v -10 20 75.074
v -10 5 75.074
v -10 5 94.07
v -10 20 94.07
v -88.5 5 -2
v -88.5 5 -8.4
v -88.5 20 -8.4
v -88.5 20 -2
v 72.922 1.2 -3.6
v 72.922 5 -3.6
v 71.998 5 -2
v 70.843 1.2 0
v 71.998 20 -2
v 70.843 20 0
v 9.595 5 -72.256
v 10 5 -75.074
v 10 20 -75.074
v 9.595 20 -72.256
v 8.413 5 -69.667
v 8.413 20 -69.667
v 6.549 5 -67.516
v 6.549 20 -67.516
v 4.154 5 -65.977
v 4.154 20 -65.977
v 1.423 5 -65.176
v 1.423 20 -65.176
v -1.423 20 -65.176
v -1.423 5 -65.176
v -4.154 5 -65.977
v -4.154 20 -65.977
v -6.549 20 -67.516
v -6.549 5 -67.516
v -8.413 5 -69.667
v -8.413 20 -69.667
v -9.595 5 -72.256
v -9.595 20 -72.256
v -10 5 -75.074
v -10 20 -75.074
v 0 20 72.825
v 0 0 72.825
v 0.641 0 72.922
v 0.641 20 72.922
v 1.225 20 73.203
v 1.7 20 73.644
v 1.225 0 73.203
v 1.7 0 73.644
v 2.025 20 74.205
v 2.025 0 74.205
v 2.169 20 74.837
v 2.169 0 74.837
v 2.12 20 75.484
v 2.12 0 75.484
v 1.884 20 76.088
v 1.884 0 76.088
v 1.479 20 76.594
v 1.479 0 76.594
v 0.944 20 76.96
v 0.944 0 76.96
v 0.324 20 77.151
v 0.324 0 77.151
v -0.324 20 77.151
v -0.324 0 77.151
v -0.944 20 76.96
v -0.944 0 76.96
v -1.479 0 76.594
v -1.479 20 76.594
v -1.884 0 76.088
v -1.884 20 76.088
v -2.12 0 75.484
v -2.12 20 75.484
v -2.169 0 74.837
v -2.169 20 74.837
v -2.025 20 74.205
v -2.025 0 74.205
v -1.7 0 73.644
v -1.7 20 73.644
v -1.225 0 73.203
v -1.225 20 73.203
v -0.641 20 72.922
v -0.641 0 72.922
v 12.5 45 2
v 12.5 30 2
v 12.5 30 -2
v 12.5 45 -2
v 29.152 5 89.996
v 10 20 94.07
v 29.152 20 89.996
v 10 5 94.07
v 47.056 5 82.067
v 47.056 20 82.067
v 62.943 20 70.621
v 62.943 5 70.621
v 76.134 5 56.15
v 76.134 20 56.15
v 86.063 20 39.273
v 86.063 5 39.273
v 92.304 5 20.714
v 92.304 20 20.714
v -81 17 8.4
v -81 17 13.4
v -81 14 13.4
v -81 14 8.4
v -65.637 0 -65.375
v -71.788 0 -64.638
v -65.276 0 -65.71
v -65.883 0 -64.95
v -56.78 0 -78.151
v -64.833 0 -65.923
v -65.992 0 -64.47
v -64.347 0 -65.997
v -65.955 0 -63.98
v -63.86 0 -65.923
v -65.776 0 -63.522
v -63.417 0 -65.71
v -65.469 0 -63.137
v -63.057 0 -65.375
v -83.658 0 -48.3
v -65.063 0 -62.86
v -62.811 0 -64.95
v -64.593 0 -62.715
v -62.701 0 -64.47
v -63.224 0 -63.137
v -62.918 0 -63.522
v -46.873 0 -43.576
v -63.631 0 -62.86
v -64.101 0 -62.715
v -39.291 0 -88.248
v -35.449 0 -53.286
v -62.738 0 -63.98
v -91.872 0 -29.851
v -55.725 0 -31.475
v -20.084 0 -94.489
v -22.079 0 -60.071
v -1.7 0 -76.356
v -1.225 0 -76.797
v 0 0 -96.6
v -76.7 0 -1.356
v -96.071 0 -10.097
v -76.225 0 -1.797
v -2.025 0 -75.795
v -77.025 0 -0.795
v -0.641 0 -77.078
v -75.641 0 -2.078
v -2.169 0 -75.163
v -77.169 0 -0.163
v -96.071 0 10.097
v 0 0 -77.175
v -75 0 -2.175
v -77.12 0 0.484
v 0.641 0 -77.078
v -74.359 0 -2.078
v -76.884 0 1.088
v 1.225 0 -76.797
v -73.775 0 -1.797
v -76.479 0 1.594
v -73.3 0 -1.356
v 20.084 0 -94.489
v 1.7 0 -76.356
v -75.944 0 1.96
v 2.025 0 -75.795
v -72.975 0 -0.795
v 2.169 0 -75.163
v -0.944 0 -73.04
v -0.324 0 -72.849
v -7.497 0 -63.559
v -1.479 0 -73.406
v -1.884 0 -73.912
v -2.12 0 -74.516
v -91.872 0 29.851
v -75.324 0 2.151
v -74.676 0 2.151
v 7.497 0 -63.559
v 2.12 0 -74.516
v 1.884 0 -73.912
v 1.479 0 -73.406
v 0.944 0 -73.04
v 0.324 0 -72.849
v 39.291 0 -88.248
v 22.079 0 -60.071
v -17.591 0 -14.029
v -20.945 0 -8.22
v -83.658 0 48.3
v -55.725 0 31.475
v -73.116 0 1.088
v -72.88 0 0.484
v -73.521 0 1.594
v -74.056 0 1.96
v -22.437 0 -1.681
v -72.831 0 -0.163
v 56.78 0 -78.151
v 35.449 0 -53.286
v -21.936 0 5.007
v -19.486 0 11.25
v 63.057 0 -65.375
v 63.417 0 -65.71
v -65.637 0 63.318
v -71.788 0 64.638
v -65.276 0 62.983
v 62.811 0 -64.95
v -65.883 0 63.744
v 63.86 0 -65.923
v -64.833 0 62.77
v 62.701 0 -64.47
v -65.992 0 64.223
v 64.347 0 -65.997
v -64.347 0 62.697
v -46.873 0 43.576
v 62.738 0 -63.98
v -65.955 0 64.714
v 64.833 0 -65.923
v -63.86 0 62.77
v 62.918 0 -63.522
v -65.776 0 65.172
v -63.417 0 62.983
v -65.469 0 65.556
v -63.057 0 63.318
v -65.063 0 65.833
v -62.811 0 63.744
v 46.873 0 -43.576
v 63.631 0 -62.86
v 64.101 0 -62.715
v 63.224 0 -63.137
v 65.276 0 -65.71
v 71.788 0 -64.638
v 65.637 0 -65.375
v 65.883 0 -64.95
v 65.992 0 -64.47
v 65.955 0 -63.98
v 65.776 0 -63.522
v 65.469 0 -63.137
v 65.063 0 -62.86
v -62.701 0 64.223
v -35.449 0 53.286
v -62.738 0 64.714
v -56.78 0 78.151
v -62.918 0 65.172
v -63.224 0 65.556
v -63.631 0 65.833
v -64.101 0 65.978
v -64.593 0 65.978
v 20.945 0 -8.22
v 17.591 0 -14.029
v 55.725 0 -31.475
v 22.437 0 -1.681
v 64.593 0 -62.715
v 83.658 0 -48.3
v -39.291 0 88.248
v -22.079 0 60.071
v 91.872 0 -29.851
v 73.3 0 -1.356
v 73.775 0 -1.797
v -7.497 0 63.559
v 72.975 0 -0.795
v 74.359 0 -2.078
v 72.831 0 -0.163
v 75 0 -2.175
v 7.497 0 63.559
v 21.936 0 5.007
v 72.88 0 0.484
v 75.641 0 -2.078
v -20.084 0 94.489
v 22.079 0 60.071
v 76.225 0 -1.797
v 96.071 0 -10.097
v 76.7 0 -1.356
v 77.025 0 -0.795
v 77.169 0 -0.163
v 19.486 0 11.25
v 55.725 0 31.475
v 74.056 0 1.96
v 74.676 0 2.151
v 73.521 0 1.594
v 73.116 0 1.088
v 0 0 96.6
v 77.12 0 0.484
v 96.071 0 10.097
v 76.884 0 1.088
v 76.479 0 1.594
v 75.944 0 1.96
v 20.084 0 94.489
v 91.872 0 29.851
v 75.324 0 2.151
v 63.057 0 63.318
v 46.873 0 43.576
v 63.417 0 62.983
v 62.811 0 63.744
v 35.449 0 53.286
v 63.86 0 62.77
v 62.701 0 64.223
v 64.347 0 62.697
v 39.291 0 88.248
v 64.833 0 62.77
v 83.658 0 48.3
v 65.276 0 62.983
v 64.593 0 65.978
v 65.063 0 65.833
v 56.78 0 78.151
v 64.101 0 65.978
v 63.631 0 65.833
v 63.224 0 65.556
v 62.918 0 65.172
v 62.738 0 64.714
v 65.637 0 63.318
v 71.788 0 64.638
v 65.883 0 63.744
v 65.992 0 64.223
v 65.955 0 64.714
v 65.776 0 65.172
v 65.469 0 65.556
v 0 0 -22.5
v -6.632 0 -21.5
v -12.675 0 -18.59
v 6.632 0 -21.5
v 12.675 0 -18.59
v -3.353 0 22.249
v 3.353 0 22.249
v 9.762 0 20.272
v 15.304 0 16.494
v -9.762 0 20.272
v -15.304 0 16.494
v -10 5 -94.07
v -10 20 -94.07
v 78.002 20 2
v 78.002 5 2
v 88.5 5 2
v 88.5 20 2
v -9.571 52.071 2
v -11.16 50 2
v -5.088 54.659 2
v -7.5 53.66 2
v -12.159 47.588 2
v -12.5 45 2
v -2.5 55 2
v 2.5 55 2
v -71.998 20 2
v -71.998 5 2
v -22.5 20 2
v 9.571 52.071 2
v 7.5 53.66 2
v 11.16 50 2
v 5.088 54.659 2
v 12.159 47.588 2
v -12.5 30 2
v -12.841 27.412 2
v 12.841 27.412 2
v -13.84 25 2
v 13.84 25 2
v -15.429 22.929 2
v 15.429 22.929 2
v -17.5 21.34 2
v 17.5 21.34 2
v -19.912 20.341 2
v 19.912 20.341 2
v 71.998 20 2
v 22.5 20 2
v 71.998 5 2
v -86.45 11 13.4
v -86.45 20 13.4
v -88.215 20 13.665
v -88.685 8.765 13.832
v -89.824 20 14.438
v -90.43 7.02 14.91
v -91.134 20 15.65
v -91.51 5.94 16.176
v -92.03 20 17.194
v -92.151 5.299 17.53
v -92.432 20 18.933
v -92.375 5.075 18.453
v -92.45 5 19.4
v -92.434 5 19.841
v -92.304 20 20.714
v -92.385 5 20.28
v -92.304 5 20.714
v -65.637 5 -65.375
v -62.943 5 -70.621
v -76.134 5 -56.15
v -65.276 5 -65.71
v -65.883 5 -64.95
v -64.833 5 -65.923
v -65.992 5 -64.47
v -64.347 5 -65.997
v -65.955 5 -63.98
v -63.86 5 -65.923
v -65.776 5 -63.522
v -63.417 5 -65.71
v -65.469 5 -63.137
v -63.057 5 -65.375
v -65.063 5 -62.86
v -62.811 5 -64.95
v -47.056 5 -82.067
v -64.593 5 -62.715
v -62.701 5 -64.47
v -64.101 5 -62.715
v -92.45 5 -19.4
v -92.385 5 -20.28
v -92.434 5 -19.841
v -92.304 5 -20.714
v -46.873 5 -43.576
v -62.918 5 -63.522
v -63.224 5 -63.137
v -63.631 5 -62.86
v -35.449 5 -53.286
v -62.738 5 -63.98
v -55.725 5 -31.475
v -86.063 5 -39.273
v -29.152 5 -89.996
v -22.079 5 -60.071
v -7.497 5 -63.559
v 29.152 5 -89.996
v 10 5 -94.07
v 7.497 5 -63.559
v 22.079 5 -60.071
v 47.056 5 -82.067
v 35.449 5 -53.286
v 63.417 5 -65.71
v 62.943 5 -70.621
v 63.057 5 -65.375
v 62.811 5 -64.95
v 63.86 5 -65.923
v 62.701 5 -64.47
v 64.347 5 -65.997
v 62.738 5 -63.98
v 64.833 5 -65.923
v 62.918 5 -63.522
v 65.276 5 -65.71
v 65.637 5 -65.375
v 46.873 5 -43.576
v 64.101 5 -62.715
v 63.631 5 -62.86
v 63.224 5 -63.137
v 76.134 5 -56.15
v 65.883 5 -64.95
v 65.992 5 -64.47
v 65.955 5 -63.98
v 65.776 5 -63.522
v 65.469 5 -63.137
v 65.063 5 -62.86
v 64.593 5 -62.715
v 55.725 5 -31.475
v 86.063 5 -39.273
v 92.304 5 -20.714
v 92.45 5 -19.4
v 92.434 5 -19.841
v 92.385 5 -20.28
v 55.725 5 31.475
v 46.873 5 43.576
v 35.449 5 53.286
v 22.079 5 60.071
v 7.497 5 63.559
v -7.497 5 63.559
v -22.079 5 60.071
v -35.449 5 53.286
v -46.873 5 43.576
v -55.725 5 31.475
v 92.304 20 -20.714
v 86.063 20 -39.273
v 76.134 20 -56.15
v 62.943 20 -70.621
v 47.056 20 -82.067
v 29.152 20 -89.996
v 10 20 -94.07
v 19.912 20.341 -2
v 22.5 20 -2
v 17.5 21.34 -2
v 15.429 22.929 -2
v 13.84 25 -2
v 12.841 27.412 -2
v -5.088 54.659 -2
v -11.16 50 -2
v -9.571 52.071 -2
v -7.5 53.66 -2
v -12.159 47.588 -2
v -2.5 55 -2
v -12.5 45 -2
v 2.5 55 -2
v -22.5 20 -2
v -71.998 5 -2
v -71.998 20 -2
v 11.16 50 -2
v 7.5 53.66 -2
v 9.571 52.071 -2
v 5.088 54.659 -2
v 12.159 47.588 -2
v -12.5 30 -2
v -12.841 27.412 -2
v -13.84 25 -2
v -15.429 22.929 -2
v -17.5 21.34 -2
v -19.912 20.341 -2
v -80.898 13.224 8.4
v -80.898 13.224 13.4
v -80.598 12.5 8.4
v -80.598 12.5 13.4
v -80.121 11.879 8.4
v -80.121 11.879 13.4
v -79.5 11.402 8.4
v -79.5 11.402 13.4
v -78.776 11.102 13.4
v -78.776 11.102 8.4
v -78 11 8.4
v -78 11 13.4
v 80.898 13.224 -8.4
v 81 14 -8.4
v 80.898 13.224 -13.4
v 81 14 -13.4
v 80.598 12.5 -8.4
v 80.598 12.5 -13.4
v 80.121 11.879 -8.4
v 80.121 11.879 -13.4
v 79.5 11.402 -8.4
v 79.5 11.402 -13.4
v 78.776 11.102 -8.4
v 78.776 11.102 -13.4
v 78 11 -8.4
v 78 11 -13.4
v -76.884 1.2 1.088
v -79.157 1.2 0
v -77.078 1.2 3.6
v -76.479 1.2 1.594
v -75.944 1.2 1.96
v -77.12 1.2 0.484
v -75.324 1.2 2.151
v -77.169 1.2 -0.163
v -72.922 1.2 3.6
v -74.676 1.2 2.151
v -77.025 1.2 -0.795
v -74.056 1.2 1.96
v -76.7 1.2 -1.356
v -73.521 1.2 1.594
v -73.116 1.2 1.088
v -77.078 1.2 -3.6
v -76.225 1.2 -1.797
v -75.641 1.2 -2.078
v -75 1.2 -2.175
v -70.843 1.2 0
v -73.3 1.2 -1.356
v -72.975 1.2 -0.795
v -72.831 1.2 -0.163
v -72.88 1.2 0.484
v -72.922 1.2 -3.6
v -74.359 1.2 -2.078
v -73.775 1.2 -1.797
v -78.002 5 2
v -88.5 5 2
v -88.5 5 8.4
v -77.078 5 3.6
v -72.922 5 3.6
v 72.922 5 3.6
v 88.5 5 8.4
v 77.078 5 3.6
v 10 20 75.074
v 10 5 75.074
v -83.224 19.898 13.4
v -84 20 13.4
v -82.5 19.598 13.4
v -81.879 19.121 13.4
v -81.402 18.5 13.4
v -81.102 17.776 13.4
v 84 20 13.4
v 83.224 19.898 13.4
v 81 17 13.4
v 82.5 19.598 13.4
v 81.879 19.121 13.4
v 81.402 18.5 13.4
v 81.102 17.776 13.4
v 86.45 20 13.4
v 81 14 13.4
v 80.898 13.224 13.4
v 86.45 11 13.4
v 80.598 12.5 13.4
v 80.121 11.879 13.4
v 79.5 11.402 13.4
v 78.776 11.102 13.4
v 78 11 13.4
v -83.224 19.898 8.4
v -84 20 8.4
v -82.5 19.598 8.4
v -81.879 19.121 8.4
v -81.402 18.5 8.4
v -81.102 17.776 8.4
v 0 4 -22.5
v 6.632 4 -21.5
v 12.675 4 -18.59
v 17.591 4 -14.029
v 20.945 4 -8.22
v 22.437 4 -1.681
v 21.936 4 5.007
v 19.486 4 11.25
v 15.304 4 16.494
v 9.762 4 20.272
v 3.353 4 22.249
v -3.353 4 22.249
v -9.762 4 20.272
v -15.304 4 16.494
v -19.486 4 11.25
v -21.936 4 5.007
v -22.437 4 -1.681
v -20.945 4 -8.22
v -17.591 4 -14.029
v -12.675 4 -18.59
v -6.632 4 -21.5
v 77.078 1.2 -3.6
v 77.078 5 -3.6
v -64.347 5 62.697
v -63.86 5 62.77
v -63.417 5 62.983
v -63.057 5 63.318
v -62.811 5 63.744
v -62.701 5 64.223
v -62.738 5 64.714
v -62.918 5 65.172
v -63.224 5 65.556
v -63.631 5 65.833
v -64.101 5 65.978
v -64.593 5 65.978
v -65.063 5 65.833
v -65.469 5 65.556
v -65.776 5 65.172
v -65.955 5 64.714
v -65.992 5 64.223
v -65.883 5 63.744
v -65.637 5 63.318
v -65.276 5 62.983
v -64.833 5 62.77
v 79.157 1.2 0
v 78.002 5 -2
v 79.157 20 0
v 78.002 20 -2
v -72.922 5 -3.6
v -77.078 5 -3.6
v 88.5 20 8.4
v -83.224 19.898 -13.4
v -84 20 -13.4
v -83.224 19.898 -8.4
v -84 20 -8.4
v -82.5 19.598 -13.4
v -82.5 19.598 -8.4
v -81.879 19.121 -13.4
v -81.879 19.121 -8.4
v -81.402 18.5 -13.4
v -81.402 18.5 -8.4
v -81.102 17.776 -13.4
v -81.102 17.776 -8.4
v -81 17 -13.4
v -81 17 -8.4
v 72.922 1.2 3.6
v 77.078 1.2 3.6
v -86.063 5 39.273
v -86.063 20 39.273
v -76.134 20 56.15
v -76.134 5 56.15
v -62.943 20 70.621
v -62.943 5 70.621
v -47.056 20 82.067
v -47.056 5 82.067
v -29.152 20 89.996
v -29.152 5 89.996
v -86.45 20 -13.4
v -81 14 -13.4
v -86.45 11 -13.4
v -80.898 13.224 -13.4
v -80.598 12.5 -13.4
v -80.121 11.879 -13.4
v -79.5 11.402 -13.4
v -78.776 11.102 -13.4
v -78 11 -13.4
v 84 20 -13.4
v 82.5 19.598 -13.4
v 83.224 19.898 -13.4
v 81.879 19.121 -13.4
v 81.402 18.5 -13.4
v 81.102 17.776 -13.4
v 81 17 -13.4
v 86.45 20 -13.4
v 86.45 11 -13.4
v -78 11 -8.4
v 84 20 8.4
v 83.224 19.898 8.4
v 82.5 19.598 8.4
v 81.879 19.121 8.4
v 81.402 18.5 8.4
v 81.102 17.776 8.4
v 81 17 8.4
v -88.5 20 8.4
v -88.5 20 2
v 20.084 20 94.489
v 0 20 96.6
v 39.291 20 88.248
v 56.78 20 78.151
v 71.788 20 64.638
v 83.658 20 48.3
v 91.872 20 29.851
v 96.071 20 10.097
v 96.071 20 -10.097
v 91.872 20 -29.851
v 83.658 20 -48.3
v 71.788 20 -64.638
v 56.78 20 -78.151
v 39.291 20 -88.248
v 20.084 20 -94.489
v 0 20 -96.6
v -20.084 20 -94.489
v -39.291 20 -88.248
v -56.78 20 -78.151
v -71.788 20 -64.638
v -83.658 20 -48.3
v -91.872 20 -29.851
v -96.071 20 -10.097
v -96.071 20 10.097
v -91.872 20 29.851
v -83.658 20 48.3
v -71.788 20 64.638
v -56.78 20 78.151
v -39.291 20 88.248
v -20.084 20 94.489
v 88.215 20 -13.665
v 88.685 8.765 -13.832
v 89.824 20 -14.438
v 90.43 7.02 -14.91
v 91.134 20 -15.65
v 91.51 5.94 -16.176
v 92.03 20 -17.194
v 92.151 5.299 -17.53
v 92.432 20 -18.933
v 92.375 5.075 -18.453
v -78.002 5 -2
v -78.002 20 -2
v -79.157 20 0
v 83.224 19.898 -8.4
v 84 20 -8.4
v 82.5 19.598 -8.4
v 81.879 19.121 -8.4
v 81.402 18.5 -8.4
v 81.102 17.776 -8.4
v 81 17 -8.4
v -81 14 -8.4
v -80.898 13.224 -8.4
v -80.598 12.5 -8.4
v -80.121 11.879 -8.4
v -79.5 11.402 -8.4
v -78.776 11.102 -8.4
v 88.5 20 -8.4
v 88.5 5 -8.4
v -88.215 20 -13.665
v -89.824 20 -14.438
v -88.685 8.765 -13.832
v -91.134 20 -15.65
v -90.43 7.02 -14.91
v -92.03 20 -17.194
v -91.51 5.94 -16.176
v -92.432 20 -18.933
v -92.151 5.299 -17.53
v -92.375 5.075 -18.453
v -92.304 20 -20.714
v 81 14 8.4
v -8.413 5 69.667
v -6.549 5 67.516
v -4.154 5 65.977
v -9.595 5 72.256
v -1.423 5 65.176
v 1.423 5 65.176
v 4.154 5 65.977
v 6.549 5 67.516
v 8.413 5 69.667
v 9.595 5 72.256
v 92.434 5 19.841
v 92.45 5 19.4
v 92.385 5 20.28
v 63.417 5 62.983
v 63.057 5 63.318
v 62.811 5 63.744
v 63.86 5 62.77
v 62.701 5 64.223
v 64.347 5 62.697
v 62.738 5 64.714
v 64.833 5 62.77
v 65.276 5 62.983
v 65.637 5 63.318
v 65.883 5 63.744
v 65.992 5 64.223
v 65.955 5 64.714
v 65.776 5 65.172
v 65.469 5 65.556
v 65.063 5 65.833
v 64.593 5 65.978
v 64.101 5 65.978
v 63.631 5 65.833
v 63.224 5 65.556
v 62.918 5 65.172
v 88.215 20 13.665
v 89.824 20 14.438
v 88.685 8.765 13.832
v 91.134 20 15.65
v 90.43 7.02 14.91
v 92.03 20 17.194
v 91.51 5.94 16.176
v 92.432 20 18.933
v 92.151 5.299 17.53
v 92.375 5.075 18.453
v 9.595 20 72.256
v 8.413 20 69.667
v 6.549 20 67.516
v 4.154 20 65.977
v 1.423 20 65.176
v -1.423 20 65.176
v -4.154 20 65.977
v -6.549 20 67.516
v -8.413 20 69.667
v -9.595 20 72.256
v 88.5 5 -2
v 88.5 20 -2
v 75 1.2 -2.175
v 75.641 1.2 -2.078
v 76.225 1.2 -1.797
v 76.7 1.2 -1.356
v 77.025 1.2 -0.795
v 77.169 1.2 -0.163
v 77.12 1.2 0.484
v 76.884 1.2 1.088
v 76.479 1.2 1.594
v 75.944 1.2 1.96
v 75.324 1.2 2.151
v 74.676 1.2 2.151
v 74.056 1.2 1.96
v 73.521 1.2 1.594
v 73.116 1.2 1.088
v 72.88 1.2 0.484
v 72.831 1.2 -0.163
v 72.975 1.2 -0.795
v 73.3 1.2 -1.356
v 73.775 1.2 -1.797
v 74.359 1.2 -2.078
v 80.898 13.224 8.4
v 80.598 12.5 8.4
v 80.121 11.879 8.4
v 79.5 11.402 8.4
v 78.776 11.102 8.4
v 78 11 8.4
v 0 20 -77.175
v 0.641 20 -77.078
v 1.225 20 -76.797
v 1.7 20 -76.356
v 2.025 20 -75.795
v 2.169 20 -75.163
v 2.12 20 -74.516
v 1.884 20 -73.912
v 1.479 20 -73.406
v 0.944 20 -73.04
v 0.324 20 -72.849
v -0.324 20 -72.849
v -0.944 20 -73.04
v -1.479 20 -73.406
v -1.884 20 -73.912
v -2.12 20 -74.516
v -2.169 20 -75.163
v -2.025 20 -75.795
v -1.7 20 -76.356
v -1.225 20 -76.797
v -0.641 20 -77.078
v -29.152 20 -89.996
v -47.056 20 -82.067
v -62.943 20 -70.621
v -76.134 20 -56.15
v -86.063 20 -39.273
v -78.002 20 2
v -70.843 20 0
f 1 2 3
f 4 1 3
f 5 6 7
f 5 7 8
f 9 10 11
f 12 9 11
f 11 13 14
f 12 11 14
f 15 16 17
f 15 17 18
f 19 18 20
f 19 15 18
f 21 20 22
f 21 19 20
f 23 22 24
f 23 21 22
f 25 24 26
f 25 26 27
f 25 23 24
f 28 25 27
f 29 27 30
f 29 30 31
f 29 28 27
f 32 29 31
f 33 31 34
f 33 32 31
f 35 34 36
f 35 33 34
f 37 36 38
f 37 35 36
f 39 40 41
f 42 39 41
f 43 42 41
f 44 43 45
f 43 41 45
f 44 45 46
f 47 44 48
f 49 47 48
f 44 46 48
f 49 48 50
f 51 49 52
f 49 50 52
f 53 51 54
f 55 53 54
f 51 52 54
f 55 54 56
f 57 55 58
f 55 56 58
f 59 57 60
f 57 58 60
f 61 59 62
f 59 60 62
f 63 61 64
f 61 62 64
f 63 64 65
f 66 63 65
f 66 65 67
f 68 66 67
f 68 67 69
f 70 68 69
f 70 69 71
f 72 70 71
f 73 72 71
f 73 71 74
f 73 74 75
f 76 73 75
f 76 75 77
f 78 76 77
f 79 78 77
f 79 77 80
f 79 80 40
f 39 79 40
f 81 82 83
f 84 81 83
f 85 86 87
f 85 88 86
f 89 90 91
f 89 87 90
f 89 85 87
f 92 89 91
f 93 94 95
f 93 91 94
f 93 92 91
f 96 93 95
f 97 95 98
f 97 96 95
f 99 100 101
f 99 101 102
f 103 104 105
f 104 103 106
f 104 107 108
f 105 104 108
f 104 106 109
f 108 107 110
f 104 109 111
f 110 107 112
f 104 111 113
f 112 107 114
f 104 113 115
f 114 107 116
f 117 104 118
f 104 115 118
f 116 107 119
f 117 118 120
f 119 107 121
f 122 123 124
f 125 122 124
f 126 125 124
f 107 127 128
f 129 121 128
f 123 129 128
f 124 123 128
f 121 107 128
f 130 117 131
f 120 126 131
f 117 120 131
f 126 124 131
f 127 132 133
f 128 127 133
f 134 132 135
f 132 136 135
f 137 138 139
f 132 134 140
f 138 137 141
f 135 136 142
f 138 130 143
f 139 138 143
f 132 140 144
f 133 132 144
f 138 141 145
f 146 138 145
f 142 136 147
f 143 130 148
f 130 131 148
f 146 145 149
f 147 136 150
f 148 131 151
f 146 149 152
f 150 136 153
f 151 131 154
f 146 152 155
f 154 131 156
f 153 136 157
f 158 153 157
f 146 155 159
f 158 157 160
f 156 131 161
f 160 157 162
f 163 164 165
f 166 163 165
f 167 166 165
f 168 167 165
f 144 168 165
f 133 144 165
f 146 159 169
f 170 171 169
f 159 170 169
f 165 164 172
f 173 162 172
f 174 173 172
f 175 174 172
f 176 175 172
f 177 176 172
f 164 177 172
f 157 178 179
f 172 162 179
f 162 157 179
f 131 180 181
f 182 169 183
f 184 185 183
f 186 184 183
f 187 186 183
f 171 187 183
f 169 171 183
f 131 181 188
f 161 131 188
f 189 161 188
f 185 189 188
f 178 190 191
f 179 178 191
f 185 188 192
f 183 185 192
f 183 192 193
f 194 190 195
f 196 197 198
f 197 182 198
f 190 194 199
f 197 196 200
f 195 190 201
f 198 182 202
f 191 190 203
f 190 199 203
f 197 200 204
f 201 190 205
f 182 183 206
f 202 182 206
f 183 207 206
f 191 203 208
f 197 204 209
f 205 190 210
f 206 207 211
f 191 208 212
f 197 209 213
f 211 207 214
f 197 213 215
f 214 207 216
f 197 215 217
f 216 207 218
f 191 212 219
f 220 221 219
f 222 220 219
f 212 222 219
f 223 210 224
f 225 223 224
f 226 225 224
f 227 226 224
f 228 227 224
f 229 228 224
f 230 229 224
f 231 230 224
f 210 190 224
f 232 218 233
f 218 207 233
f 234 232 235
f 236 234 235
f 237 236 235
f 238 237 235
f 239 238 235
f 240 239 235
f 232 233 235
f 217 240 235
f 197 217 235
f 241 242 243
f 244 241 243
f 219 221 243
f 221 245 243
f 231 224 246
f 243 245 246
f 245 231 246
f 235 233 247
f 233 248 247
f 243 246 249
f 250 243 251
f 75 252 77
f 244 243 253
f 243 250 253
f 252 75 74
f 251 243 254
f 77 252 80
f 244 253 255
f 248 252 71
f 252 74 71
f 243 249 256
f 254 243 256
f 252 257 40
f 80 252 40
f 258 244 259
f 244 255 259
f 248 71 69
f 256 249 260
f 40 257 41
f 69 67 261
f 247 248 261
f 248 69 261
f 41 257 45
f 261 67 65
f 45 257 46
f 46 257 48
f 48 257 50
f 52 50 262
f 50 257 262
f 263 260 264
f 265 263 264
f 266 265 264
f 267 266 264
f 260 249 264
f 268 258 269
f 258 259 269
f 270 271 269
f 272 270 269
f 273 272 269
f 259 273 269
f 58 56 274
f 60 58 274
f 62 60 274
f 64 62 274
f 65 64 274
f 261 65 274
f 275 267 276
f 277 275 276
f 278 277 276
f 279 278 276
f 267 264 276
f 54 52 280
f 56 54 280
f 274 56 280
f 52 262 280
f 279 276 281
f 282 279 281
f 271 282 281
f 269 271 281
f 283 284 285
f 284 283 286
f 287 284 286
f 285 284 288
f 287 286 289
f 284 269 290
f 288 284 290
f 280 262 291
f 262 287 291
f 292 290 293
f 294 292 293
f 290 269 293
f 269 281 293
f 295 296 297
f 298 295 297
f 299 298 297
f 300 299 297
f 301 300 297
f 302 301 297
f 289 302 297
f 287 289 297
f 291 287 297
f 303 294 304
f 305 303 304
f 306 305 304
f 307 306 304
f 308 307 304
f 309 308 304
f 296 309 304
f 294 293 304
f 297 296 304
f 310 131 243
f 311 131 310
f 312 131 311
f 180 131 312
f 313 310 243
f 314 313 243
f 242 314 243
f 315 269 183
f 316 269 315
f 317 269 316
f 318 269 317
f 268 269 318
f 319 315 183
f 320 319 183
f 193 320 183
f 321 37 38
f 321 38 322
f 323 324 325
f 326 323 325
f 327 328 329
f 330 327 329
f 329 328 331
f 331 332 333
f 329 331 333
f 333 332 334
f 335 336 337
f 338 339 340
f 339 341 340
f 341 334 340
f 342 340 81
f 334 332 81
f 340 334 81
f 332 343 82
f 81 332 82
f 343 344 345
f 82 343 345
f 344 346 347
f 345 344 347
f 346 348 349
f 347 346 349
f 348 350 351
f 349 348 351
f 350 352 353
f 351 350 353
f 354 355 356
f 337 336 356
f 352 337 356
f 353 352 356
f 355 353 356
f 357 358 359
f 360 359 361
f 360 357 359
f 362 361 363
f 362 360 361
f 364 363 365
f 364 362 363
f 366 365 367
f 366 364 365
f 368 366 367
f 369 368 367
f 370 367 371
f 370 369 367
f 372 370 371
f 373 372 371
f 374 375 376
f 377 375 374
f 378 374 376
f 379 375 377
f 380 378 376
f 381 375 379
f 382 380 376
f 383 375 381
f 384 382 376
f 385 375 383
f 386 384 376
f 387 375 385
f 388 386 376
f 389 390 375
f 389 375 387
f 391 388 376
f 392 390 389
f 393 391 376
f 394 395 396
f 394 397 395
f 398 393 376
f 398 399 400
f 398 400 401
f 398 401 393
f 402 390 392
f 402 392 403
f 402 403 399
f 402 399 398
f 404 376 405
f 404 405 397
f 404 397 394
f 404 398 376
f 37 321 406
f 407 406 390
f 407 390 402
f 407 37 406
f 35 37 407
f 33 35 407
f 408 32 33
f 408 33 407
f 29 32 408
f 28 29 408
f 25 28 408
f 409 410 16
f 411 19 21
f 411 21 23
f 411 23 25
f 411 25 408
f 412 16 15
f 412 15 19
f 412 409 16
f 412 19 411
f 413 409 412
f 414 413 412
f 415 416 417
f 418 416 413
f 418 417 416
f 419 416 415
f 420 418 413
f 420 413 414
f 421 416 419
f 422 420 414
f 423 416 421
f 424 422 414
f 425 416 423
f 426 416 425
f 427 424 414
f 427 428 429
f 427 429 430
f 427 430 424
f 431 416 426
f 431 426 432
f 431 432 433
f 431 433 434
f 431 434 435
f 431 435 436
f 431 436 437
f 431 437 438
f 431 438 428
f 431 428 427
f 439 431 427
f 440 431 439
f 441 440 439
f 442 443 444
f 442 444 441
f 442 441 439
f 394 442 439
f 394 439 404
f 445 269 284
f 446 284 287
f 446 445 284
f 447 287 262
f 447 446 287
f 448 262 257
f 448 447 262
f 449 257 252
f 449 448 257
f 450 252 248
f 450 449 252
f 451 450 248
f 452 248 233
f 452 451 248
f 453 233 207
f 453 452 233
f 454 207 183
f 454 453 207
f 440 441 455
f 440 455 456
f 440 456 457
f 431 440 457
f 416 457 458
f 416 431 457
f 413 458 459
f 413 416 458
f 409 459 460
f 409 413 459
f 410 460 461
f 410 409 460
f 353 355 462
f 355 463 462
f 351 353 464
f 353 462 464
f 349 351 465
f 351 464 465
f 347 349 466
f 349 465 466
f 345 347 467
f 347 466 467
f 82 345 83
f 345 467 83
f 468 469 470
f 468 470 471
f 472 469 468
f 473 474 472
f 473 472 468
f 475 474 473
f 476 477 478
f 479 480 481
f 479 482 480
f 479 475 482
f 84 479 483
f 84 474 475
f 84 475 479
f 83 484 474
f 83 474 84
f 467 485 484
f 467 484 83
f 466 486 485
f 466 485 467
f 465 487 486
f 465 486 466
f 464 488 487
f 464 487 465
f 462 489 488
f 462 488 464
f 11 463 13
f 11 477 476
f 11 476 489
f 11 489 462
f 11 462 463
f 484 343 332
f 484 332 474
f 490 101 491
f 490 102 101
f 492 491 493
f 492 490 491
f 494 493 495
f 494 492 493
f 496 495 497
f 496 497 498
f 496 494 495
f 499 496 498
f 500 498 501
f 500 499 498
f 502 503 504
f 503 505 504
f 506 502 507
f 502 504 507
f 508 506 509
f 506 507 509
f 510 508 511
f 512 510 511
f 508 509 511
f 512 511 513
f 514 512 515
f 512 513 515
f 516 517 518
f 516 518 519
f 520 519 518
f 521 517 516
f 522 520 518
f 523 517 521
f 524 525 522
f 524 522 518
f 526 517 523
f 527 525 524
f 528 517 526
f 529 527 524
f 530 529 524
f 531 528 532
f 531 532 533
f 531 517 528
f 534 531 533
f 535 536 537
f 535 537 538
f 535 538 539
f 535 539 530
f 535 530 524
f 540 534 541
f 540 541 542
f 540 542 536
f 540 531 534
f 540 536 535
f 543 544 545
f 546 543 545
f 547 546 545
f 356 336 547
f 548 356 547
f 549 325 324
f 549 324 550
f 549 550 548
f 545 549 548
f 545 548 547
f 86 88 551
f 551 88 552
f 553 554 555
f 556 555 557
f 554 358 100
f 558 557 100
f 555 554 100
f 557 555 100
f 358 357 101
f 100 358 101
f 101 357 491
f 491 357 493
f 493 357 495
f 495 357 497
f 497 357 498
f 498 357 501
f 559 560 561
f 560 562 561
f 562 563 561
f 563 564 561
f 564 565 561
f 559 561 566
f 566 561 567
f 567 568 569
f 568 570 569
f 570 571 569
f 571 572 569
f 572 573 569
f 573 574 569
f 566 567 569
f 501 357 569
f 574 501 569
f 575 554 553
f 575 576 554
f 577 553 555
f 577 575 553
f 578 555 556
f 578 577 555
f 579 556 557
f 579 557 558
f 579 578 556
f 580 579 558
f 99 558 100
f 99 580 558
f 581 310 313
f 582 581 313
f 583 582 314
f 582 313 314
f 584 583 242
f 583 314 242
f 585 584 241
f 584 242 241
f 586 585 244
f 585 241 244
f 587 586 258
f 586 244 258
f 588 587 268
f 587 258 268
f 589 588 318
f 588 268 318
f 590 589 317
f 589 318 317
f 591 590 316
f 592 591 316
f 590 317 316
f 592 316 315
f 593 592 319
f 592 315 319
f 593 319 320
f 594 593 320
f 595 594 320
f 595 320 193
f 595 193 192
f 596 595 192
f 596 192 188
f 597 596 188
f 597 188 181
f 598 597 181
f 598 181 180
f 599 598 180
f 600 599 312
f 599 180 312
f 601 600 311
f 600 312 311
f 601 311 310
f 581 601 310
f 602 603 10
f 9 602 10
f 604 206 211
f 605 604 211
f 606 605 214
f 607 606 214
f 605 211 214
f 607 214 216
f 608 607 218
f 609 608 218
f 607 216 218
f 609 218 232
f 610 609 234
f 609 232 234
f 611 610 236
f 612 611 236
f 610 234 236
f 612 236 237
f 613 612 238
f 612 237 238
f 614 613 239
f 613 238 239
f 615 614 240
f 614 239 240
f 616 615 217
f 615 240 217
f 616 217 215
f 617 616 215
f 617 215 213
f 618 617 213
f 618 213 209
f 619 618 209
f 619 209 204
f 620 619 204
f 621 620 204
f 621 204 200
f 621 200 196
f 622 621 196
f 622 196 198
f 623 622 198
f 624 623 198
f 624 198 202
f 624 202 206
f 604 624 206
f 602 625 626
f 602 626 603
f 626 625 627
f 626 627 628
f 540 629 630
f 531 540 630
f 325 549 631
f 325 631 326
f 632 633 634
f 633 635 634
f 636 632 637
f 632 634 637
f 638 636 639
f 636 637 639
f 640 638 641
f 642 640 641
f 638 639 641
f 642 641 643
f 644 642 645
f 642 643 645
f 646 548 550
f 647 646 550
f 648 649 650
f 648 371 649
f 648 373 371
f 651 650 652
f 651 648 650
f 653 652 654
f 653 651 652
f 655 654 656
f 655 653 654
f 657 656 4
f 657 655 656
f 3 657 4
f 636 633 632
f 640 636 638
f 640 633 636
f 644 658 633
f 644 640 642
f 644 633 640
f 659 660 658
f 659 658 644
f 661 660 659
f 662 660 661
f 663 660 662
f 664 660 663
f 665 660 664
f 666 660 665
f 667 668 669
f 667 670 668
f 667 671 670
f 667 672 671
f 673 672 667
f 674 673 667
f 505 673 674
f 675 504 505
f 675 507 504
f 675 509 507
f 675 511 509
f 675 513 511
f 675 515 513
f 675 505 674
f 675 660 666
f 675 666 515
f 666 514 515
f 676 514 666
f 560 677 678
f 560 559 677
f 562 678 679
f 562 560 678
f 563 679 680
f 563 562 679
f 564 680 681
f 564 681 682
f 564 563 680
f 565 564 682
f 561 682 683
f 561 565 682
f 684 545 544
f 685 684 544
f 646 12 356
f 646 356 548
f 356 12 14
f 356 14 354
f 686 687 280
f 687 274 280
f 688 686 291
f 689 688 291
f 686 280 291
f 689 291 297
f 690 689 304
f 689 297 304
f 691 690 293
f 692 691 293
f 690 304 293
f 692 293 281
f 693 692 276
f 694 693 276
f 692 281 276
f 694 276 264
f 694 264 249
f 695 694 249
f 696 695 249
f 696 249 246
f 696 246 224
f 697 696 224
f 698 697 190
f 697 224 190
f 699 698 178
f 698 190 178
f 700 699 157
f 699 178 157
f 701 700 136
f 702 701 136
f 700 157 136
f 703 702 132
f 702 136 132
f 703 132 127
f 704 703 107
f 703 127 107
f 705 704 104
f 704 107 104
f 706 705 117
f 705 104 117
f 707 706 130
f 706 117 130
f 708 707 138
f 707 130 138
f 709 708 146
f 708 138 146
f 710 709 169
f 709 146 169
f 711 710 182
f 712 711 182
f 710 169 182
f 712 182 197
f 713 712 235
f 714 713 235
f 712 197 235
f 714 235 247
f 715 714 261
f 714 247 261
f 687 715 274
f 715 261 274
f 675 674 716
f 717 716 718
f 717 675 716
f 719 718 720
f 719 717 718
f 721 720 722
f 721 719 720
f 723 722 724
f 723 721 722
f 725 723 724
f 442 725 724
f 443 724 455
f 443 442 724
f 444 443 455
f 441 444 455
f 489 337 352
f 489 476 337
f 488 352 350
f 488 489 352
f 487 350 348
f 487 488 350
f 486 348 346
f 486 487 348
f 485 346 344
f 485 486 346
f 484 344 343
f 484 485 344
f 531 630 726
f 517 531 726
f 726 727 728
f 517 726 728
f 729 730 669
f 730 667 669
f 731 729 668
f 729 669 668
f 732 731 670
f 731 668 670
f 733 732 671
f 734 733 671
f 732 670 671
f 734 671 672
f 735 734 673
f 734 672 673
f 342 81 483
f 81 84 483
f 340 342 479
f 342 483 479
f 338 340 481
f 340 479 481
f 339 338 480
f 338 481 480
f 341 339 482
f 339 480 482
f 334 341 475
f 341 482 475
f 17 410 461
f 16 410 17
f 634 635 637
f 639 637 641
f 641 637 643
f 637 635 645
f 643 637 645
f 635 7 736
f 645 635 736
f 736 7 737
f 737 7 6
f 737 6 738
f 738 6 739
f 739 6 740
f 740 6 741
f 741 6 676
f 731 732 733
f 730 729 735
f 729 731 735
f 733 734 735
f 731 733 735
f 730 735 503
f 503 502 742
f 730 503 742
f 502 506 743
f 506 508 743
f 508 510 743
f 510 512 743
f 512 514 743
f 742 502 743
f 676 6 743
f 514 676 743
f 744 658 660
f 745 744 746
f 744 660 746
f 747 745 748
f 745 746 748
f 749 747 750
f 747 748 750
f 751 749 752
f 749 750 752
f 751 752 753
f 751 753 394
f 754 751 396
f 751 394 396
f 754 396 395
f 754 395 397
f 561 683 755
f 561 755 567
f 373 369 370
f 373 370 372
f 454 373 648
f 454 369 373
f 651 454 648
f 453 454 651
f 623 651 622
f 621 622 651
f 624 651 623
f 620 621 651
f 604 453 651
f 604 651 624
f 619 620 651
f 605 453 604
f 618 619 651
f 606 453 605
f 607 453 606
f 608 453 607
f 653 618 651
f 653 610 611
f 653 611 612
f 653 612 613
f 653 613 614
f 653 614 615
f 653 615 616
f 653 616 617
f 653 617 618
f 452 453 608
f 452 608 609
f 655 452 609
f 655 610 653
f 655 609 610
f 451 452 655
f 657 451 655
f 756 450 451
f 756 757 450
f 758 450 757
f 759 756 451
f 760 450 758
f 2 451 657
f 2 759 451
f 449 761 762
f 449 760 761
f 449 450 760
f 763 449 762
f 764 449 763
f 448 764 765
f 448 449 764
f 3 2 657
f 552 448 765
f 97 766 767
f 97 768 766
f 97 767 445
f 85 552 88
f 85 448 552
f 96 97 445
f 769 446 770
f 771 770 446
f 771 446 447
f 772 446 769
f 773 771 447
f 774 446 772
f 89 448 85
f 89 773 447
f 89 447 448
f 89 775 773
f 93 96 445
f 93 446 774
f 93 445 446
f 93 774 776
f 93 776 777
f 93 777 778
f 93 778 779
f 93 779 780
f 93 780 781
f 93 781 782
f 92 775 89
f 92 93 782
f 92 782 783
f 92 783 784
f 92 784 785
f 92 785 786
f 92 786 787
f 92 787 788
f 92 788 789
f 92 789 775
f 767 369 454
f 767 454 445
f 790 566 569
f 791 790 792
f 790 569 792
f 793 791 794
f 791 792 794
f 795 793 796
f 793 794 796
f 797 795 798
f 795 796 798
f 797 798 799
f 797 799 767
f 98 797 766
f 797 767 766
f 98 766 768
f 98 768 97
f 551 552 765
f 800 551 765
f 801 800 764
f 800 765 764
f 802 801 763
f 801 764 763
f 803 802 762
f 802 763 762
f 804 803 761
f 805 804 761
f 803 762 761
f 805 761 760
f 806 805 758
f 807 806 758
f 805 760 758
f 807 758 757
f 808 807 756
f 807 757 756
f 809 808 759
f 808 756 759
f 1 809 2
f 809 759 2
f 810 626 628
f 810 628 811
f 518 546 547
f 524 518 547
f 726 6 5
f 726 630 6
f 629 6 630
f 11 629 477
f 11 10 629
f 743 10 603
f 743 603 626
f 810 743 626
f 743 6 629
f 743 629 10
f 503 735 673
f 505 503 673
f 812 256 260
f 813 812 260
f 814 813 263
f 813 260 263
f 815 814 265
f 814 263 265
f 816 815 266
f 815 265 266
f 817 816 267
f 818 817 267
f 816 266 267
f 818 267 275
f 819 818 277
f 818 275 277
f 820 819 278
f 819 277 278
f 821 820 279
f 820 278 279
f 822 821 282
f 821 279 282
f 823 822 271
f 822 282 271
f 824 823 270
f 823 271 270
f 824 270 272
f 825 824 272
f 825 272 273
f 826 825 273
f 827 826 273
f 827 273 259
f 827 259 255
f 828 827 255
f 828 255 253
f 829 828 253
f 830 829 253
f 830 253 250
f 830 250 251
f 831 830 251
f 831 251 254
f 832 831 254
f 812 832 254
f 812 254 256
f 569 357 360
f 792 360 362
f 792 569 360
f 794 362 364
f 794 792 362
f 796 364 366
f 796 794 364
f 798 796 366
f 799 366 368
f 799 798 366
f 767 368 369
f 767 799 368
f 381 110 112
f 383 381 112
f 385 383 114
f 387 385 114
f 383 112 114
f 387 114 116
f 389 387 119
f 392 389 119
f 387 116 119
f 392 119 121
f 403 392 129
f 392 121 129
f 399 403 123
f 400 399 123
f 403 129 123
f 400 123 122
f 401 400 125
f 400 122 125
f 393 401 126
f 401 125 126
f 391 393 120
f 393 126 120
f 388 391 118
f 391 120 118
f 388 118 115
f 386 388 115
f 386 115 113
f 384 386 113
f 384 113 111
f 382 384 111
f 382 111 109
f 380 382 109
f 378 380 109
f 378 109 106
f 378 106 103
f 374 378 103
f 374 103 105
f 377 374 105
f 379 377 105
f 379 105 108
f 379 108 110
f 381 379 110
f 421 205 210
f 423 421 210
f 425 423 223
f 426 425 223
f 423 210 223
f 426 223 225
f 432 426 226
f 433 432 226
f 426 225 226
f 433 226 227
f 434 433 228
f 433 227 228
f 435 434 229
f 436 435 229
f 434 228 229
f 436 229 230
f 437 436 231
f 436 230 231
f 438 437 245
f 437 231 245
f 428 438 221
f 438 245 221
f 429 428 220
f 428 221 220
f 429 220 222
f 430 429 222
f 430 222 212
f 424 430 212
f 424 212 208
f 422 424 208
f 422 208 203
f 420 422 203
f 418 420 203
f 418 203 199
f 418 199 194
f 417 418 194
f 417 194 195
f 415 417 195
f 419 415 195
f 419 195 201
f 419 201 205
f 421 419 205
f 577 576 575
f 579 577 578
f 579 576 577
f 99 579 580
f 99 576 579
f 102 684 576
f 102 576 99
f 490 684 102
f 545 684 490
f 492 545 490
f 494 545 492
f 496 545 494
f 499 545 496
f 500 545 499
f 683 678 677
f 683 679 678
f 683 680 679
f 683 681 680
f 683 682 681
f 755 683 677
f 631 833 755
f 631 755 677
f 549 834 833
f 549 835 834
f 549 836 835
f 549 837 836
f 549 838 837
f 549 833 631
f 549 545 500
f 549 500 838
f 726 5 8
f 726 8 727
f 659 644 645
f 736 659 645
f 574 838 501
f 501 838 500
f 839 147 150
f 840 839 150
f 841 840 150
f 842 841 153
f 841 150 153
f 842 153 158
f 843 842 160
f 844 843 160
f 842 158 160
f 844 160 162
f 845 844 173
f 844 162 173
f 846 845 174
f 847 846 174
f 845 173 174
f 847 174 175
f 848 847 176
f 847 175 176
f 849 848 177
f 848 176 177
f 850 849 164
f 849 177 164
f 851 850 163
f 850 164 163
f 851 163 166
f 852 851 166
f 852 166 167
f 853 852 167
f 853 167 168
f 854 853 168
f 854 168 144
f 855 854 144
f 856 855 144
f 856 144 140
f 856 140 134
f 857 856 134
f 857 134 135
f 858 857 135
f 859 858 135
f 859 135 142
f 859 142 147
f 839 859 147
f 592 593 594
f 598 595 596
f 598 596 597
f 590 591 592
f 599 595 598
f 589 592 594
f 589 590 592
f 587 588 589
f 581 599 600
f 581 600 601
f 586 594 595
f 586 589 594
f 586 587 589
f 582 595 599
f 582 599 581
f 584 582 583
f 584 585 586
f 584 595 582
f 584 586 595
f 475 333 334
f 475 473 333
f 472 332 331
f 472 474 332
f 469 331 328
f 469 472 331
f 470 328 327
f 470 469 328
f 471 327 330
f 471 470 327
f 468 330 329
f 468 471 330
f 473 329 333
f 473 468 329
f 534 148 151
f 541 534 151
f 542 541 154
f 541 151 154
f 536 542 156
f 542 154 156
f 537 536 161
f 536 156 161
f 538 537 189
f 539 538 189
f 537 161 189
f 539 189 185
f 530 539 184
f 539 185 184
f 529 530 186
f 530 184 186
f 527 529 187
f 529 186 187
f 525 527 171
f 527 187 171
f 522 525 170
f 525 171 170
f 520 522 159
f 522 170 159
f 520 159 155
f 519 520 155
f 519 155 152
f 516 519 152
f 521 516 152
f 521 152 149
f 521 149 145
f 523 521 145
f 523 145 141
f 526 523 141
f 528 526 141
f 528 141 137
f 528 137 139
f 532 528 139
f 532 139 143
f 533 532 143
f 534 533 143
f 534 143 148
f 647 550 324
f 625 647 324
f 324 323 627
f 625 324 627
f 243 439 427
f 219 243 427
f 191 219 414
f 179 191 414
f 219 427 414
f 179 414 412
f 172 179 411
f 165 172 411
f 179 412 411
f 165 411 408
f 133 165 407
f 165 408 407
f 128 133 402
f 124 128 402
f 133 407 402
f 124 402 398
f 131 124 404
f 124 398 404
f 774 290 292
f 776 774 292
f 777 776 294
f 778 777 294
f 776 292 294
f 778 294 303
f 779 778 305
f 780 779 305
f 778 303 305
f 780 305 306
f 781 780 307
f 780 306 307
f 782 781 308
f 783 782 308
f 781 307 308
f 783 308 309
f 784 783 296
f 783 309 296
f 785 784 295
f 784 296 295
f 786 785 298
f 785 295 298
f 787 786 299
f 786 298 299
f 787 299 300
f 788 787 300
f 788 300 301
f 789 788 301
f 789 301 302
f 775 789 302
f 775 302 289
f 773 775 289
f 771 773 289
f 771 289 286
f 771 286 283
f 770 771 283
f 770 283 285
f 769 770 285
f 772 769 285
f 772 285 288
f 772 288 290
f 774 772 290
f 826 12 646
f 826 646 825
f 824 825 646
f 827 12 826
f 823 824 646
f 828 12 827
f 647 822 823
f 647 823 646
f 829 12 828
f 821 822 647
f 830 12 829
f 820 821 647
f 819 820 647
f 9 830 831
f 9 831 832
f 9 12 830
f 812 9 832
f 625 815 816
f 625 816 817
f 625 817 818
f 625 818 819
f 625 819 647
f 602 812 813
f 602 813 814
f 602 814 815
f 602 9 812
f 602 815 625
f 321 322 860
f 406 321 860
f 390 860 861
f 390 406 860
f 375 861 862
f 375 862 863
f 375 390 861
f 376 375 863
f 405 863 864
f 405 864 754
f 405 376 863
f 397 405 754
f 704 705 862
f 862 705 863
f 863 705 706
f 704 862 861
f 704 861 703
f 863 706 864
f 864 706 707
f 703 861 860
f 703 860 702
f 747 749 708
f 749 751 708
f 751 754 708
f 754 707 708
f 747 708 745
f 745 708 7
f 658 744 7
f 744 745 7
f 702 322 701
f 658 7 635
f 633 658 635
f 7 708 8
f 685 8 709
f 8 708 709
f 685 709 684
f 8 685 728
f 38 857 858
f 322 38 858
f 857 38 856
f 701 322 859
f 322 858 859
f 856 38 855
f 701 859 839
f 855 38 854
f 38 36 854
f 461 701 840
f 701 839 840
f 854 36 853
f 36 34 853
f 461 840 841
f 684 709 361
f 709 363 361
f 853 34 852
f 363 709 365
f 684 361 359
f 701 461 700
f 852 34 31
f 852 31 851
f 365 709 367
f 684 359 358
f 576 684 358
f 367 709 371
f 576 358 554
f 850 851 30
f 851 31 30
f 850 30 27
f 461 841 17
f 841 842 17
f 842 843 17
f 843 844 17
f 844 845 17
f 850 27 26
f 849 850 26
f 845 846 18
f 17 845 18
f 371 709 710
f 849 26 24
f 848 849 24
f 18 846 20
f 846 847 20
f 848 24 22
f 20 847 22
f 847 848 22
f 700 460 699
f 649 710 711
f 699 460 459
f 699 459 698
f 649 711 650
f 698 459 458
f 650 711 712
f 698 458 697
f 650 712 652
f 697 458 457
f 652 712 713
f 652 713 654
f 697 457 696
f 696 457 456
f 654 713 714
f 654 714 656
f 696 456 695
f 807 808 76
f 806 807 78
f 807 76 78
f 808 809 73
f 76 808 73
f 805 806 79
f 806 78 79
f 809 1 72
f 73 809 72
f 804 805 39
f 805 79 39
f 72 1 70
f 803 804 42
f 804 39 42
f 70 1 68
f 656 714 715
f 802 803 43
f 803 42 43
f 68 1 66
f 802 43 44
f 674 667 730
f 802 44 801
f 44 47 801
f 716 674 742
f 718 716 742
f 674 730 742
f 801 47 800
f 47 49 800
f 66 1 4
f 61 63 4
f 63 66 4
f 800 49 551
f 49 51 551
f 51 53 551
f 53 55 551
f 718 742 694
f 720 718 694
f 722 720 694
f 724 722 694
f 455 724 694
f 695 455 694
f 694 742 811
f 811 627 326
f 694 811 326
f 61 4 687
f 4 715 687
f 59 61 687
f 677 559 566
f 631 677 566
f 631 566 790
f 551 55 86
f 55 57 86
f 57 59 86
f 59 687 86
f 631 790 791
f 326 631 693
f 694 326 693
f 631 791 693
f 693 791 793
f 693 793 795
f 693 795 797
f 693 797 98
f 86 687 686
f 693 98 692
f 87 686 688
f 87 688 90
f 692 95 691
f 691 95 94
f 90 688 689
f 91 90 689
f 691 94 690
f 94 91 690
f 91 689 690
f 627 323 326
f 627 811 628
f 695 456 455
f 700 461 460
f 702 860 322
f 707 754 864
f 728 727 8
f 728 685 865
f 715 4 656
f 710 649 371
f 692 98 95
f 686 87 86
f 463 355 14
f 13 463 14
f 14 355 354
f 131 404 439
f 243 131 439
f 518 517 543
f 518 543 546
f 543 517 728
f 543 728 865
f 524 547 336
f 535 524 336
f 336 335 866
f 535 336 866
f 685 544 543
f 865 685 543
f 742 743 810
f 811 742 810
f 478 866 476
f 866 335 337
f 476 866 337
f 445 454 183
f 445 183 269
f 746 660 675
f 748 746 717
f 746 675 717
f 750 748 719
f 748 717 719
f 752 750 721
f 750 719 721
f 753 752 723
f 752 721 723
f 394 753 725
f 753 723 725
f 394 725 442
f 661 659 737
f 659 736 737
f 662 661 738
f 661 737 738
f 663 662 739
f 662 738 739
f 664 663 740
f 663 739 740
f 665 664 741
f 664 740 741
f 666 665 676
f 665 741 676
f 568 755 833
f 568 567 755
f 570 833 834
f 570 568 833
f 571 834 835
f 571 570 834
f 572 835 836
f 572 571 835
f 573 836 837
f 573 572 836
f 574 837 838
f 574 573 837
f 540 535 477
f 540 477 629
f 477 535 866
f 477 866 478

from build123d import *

# Parameters (mm, degrees)
SKETCH1_R           = 96.6
BOSS_EXTRUDE1_DEPTH = 5
SKETCH4_R           = 96.6
SKETCH4_R_2         = 94.6
BOSS_EXTRUDE3_DEPTH = 15
SKETCH5_W           = 189.2
SKETCH5_H           = 13.4
SKETCH5_W_2         = 177
SKETCH5_H_2         = 6.4
BOSS_EXTRUDE4_DEPTH = 15
SKETCH6_R           = 22.5
CUT_EXTRUDE1_DEPTH  = 4
CUT_EXTRUDE2_DEPTH  = 9
BOSS_EXTRUDE6_DEPTH = 15
SKETCH8_R           = 2.175
CUT_EXTRUDE4_DEPTH  = 29
CUT_EXTRUDE9_DEPTH  = 30
FILLET3_R           = 3
SKETCH20_R          = 1.65
CUT_EXTRUDE10_DEPTH = 10
SKETCH24_W          = 25
SKETCH24_H          = 4
BOSS_EXTRUDE8_DEPTH = 35
FILLET2_R           = 10
CUT_EXTRUDE11_DEPTH = 18.8
FILLET4_R           = 6


with BuildPart() as part:
    # Sketch1 → Boss-Extrude1 (new body)
    with BuildSketch(Plane(origin=(0, 0, 0), x_dir=(1, 0, 0), z_dir=(0, 1, 0))):
        with Locations(Location((0, 0, 0), (0, 0, 270))):
            Circle(SKETCH1_R)
    extrude(amount=BOSS_EXTRUDE1_DEPTH)

    # Sketch4 → Boss-Extrude3 (add)
    with BuildSketch(Plane(origin=(0, 5, 0), x_dir=(1, 0, 0), z_dir=(0, 1, 0))):
        with Locations(Location((0, 0, 0), (0, 0, 270))):
            Circle(SKETCH4_R)
        with Locations(Location((0, 0, 0), (0, 0, 270))):
            Circle(SKETCH4_R_2, mode=Mode.SUBTRACT)
    extrude(amount=BOSS_EXTRUDE3_DEPTH)

    # Sketch5 → Boss-Extrude4 (add)
    with BuildSketch(Plane(origin=(0, 5, 0), x_dir=(1, 0, 0), z_dir=(0, 1, 0))):
        with Locations((0, -6.7)):
            Rectangle(SKETCH5_W, SKETCH5_H)
        with Locations((0, -5.2)):
            Rectangle(SKETCH5_W_2, SKETCH5_H_2, mode=Mode.SUBTRACT)
    boss_extrude4 = extrude(amount=BOSS_EXTRUDE4_DEPTH)

    # Mirror1: Boss-Extrude4 across plane
    add(boss_extrude4.mirror(Plane.XY))

    # Sketch6 → Cut-Extrude1 (cut)
    with BuildSketch(Plane.XZ):
        with Locations(Location((0, 0, 0), (0, 0, 270))):
            Circle(SKETCH6_R)
    extrude(amount=-CUT_EXTRUDE1_DEPTH, mode=Mode.SUBTRACT)

    # Sketch7 → Cut-Extrude2 (cut)
    with BuildSketch(Plane(origin=(0, 20, 0), x_dir=(1, 0, 0), z_dir=(0, 1, 0))):
        Polygon((0, -13.4), (-81, -13.4), (-81, -8.4), (0, -8.4), (81, -8.4), (81, -13.4), align=None)
    cut_extrude2 = extrude(amount=-CUT_EXTRUDE2_DEPTH, mode=Mode.SUBTRACT)

    # Mirror2: Cut-Extrude2 across plane
    add(cut_extrude2.mirror(Plane.XY), mode=Mode.SUBTRACT)

    # Sketch10 → Boss-Extrude6 (add)
    with BuildSketch(Plane(origin=(0, 5, 0), x_dir=(1, 0, 0), z_dir=(0, 1, 0))):
        with BuildLine():
            Line((-10, -75.073785704), (-10, -95.073785704))
            Line((-10, -95.073785704), (10, -95.073785704))
            Line((10, -95.073785704), (10, -75.073785704))
            ThreePointArc((10, -75.073785704), (0, -65.073785704), (-10, -75.073785704))
        make_face()
    boss_extrude6 = extrude(amount=BOSS_EXTRUDE6_DEPTH)

    # Mirror3: Boss-Extrude6 across plane
    add(boss_extrude6.mirror(Plane.XY))

    # Sketch8 → Cut-Extrude4 (cut)
    with BuildSketch(Plane.XZ):
        with Locations(Location((-75, 0, 0), (0, 0, 270))):
            Circle(SKETCH8_R)
        with Locations(Location((0, 75, 0), (0, 0, 270))):
            Circle(SKETCH8_R)
        with Locations(Location((75, 0, 0), (0, 0, 270))):
            Circle(SKETCH8_R)
        with Locations(Location((0, -75, 0), (0, 0, 270))):
            Circle(SKETCH8_R)
    extrude(amount=-CUT_EXTRUDE4_DEPTH, mode=Mode.SUBTRACT)

    # Sketch19 → Cut-Extrude9 (cut)
    with BuildSketch(Plane(origin=(0, 5, 0), x_dir=(1, 0, 0), z_dir=(0, 1, 0))):
        with BuildLine():
            Line((-55.725373322, -31.475113472), (55.725373322, -31.475113472))
            ThreePointArc((55.725373322, -31.475113472), (0, -64), (-55.725373322, -31.475113472))
        make_face()
    cut_extrude9 = extrude(amount=-CUT_EXTRUDE9_DEPTH, mode=Mode.SUBTRACT)

    # Mirror4: Cut-Extrude9 across plane
    add(cut_extrude9.mirror(Plane.XY), mode=Mode.SUBTRACT)

    # Fillet3
    fillet3_edges = [part.edges().sort_by_distance(p)[0] for p in [
        (81, 20, -10.9),
        (-81, 20, -10.9),
        (81, 11, -10.9),
        (-81, 11, -10.9),
        (-81, 11, 10.9),
        (81, 11, 10.9),
        (81, 20, 10.9),
        (-81, 20, 10.9),
    ]]
    fillet(fillet3_edges, radius=FILLET3_R)

    # Sketch20 → Cut-Extrude10 (cut)
    with BuildSketch(Plane.XZ):
        with Locations(Location((-64.346717088, 64.346717088, 0), (0, 0, 270))):
            Circle(SKETCH20_R)
        with Locations(Location((64.346717088, 64.346717088, 0), (0, 0, 270))):
            Circle(SKETCH20_R)
        with Locations(Location((64.346717088, -64.346717088, 0), (0, 0, 270))):
            Circle(SKETCH20_R)
        with Locations(Location((-64.346717088, -64.346717088, 0), (0, 0, 270))):
            Circle(SKETCH20_R)
    extrude(amount=-CUT_EXTRUDE10_DEPTH, mode=Mode.SUBTRACT)

    # Sketch24 → Boss-Extrude8 (add)
    with BuildSketch(Plane(origin=(0, 20, 0), x_dir=(1, 0, 0), z_dir=(0, 1, 0))):
        Rectangle(SKETCH24_W, SKETCH24_H)
    extrude(amount=BOSS_EXTRUDE8_DEPTH)

    # Fillet2
    fillet2_edges = [part.edges().sort_by_distance(p)[0] for p in [
        (12.5, 20, 0),
        (-12.5, 20, 0),
        (12.5, 55, 0),
        (-12.5, 55, 0),
    ]]
    fillet(fillet2_edges, radius=FILLET2_R)

    # Sketch25 → Cut-Extrude11 (cut)
    with BuildSketch(Plane(origin=(0, 20, 0), x_dir=(1, 0, 0), z_dir=(0, 1, 0))):
        Polygon((70.843078062, 0), (72.921539031, -3.6), (77.078460969, -3.6), (79.156921938, 0), (77.078460969, 3.6), (72.921539031, 3.6), align=None)
        Polygon((-70.843078062, 0), (-72.921539031, 3.6), (-77.078460969, 3.6), (-79.156921938, 0), (-77.078460969, -3.6), (-72.921539031, -3.6), align=None)
    extrude(amount=-CUT_EXTRUDE11_DEPTH, mode=Mode.SUBTRACT)

    # Fillet4
    fillet4_edges = [part.edges().sort_by_distance(p)[0] for p in [
        (0, 5, 13.4),
        (93.646142473, 12.5, 13.4),
        (-93.646142473, 12.5, 13.4),
        (93.646142473, 12.5, -13.4),
        (-93.646142473, 12.5, -13.4),
        (0, 5, -13.4),
    ]]
    fillet(fillet4_edges, radius=FILLET4_R - 0.0001)  # a hair under: the kernel refuses the full size


solid = part.part
